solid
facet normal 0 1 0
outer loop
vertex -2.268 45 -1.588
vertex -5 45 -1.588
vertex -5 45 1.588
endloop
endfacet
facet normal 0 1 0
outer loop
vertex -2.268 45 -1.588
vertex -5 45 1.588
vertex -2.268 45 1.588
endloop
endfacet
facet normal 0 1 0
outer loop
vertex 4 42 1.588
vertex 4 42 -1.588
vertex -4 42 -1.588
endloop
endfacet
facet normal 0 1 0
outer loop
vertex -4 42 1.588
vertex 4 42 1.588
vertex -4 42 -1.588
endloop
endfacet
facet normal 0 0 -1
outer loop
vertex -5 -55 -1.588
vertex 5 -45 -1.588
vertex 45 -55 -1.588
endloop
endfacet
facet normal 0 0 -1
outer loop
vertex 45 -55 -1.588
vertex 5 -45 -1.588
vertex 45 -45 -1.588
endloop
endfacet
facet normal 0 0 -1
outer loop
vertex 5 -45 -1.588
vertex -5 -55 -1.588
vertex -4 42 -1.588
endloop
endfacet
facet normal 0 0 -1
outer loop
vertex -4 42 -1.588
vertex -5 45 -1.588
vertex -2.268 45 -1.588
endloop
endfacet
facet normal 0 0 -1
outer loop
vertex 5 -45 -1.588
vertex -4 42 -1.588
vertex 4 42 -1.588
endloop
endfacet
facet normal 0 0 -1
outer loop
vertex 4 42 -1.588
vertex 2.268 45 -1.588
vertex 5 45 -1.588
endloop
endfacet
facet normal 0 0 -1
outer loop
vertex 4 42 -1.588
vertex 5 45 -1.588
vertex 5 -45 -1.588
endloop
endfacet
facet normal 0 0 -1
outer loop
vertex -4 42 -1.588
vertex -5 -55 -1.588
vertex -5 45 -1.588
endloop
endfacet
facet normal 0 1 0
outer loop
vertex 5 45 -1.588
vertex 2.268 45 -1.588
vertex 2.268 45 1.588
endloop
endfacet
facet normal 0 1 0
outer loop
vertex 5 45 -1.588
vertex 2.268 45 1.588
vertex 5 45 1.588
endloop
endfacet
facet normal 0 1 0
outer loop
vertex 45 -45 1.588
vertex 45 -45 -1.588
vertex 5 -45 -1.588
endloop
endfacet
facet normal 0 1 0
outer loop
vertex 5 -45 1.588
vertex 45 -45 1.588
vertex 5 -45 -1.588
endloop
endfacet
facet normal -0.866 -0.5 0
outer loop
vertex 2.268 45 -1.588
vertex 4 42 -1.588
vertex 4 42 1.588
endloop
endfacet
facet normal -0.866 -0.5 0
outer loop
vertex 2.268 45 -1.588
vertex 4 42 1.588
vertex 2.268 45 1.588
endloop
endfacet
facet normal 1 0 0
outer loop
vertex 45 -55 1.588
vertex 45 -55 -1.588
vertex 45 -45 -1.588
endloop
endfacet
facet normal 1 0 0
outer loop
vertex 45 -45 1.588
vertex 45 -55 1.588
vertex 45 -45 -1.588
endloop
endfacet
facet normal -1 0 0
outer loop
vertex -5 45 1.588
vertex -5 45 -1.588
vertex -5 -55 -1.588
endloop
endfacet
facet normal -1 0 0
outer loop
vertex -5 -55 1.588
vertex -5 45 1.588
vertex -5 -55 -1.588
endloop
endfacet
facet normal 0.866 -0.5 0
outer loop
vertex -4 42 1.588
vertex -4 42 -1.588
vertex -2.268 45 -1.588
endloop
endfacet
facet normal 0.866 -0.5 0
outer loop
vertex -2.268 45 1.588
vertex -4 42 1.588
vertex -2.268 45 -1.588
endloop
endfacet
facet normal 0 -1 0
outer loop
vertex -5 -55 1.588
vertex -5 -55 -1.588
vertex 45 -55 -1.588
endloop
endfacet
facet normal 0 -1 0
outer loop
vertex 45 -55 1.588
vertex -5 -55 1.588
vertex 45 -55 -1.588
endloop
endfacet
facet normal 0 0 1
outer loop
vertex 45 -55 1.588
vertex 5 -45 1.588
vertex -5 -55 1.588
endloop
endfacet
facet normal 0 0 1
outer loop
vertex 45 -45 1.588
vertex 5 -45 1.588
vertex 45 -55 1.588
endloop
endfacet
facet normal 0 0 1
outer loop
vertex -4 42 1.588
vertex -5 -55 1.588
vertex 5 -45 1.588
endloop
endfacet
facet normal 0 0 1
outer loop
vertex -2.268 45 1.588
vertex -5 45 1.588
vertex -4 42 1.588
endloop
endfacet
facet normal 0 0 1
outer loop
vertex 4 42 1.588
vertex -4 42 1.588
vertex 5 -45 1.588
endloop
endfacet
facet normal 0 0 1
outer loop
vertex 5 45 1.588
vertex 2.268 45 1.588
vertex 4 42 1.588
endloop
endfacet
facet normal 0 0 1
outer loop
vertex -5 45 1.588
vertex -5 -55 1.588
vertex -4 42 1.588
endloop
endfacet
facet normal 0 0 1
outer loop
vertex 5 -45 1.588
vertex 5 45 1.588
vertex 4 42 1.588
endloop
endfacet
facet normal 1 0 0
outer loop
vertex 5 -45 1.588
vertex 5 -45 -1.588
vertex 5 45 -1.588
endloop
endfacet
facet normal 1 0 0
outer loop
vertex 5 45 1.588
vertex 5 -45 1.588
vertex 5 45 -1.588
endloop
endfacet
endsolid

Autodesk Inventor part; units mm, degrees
ref_plane "YZ Plane" through (0, 0, 0) normal (1, 0, 0) x (0, 1, 0)
ref_plane "XZ Plane" through (0, 0, 0) normal (0, 1, 0) x (-1, 0, 0)
ref_plane "XY Plane" through (0, 0, 0) normal (0, 0, 1) x (1, 0, 0)
sketch "Sketch1" plane through (0, 0, 0) normal (0, 0, 1) x (1, 0, 0)
  line L0 (5, -45) -> (5, 45)
  line L1 (-5, 45) -> (-5, -55)
  line L2 (-5, -55) -> (45, -55)
  line L3 (45, -55) -> (45, -45)
  line L4 (45, -45) -> (5, -45)
  line L5 (0, 45) -> (0, 42) construction
  line L6 (0, 42) -> (4, 42)
  line L7 (4, 42) -> (0, 42)
  line L8 (4, 42) -> (11.2559, 42) construction
  line L9 (4, 42) -> (2.2679, 45)
  line L10 (4, 42) -> (7.4641, 42) construction
  line L11 (0, 42) -> (-4, 42)
  line L12 (-4, 42) -> (-2.2679, 45)
  line L13 (-5, 45) -> (-2.2679, 45)
  line L14 (2.2679, 45) -> (5, 45)
  line L15 (2.2679, 45) -> (-2.2679, 45) construction
  point P0 (0, 0)
  dimension "d0" = 10
  dimension "d1" = 45
  dimension "d2" = 100
  dimension "d3" = 45
  dimension "d4" = 5
  dimension "d5" = 50
  dimension "d8" = 3
  dimension "d9" = 4
  dimension "d12" = 120
  dimension "d13" = 4
  dimension "d14" = 60
  dimension "d15" = 45
  dimension "d16" = 87
  dimension "d17" = 33.7441
extrude "Extrusion1" add sketch "Sketch1" along normal mid plane 3.175
properties part number "Liu_Inital_L"
